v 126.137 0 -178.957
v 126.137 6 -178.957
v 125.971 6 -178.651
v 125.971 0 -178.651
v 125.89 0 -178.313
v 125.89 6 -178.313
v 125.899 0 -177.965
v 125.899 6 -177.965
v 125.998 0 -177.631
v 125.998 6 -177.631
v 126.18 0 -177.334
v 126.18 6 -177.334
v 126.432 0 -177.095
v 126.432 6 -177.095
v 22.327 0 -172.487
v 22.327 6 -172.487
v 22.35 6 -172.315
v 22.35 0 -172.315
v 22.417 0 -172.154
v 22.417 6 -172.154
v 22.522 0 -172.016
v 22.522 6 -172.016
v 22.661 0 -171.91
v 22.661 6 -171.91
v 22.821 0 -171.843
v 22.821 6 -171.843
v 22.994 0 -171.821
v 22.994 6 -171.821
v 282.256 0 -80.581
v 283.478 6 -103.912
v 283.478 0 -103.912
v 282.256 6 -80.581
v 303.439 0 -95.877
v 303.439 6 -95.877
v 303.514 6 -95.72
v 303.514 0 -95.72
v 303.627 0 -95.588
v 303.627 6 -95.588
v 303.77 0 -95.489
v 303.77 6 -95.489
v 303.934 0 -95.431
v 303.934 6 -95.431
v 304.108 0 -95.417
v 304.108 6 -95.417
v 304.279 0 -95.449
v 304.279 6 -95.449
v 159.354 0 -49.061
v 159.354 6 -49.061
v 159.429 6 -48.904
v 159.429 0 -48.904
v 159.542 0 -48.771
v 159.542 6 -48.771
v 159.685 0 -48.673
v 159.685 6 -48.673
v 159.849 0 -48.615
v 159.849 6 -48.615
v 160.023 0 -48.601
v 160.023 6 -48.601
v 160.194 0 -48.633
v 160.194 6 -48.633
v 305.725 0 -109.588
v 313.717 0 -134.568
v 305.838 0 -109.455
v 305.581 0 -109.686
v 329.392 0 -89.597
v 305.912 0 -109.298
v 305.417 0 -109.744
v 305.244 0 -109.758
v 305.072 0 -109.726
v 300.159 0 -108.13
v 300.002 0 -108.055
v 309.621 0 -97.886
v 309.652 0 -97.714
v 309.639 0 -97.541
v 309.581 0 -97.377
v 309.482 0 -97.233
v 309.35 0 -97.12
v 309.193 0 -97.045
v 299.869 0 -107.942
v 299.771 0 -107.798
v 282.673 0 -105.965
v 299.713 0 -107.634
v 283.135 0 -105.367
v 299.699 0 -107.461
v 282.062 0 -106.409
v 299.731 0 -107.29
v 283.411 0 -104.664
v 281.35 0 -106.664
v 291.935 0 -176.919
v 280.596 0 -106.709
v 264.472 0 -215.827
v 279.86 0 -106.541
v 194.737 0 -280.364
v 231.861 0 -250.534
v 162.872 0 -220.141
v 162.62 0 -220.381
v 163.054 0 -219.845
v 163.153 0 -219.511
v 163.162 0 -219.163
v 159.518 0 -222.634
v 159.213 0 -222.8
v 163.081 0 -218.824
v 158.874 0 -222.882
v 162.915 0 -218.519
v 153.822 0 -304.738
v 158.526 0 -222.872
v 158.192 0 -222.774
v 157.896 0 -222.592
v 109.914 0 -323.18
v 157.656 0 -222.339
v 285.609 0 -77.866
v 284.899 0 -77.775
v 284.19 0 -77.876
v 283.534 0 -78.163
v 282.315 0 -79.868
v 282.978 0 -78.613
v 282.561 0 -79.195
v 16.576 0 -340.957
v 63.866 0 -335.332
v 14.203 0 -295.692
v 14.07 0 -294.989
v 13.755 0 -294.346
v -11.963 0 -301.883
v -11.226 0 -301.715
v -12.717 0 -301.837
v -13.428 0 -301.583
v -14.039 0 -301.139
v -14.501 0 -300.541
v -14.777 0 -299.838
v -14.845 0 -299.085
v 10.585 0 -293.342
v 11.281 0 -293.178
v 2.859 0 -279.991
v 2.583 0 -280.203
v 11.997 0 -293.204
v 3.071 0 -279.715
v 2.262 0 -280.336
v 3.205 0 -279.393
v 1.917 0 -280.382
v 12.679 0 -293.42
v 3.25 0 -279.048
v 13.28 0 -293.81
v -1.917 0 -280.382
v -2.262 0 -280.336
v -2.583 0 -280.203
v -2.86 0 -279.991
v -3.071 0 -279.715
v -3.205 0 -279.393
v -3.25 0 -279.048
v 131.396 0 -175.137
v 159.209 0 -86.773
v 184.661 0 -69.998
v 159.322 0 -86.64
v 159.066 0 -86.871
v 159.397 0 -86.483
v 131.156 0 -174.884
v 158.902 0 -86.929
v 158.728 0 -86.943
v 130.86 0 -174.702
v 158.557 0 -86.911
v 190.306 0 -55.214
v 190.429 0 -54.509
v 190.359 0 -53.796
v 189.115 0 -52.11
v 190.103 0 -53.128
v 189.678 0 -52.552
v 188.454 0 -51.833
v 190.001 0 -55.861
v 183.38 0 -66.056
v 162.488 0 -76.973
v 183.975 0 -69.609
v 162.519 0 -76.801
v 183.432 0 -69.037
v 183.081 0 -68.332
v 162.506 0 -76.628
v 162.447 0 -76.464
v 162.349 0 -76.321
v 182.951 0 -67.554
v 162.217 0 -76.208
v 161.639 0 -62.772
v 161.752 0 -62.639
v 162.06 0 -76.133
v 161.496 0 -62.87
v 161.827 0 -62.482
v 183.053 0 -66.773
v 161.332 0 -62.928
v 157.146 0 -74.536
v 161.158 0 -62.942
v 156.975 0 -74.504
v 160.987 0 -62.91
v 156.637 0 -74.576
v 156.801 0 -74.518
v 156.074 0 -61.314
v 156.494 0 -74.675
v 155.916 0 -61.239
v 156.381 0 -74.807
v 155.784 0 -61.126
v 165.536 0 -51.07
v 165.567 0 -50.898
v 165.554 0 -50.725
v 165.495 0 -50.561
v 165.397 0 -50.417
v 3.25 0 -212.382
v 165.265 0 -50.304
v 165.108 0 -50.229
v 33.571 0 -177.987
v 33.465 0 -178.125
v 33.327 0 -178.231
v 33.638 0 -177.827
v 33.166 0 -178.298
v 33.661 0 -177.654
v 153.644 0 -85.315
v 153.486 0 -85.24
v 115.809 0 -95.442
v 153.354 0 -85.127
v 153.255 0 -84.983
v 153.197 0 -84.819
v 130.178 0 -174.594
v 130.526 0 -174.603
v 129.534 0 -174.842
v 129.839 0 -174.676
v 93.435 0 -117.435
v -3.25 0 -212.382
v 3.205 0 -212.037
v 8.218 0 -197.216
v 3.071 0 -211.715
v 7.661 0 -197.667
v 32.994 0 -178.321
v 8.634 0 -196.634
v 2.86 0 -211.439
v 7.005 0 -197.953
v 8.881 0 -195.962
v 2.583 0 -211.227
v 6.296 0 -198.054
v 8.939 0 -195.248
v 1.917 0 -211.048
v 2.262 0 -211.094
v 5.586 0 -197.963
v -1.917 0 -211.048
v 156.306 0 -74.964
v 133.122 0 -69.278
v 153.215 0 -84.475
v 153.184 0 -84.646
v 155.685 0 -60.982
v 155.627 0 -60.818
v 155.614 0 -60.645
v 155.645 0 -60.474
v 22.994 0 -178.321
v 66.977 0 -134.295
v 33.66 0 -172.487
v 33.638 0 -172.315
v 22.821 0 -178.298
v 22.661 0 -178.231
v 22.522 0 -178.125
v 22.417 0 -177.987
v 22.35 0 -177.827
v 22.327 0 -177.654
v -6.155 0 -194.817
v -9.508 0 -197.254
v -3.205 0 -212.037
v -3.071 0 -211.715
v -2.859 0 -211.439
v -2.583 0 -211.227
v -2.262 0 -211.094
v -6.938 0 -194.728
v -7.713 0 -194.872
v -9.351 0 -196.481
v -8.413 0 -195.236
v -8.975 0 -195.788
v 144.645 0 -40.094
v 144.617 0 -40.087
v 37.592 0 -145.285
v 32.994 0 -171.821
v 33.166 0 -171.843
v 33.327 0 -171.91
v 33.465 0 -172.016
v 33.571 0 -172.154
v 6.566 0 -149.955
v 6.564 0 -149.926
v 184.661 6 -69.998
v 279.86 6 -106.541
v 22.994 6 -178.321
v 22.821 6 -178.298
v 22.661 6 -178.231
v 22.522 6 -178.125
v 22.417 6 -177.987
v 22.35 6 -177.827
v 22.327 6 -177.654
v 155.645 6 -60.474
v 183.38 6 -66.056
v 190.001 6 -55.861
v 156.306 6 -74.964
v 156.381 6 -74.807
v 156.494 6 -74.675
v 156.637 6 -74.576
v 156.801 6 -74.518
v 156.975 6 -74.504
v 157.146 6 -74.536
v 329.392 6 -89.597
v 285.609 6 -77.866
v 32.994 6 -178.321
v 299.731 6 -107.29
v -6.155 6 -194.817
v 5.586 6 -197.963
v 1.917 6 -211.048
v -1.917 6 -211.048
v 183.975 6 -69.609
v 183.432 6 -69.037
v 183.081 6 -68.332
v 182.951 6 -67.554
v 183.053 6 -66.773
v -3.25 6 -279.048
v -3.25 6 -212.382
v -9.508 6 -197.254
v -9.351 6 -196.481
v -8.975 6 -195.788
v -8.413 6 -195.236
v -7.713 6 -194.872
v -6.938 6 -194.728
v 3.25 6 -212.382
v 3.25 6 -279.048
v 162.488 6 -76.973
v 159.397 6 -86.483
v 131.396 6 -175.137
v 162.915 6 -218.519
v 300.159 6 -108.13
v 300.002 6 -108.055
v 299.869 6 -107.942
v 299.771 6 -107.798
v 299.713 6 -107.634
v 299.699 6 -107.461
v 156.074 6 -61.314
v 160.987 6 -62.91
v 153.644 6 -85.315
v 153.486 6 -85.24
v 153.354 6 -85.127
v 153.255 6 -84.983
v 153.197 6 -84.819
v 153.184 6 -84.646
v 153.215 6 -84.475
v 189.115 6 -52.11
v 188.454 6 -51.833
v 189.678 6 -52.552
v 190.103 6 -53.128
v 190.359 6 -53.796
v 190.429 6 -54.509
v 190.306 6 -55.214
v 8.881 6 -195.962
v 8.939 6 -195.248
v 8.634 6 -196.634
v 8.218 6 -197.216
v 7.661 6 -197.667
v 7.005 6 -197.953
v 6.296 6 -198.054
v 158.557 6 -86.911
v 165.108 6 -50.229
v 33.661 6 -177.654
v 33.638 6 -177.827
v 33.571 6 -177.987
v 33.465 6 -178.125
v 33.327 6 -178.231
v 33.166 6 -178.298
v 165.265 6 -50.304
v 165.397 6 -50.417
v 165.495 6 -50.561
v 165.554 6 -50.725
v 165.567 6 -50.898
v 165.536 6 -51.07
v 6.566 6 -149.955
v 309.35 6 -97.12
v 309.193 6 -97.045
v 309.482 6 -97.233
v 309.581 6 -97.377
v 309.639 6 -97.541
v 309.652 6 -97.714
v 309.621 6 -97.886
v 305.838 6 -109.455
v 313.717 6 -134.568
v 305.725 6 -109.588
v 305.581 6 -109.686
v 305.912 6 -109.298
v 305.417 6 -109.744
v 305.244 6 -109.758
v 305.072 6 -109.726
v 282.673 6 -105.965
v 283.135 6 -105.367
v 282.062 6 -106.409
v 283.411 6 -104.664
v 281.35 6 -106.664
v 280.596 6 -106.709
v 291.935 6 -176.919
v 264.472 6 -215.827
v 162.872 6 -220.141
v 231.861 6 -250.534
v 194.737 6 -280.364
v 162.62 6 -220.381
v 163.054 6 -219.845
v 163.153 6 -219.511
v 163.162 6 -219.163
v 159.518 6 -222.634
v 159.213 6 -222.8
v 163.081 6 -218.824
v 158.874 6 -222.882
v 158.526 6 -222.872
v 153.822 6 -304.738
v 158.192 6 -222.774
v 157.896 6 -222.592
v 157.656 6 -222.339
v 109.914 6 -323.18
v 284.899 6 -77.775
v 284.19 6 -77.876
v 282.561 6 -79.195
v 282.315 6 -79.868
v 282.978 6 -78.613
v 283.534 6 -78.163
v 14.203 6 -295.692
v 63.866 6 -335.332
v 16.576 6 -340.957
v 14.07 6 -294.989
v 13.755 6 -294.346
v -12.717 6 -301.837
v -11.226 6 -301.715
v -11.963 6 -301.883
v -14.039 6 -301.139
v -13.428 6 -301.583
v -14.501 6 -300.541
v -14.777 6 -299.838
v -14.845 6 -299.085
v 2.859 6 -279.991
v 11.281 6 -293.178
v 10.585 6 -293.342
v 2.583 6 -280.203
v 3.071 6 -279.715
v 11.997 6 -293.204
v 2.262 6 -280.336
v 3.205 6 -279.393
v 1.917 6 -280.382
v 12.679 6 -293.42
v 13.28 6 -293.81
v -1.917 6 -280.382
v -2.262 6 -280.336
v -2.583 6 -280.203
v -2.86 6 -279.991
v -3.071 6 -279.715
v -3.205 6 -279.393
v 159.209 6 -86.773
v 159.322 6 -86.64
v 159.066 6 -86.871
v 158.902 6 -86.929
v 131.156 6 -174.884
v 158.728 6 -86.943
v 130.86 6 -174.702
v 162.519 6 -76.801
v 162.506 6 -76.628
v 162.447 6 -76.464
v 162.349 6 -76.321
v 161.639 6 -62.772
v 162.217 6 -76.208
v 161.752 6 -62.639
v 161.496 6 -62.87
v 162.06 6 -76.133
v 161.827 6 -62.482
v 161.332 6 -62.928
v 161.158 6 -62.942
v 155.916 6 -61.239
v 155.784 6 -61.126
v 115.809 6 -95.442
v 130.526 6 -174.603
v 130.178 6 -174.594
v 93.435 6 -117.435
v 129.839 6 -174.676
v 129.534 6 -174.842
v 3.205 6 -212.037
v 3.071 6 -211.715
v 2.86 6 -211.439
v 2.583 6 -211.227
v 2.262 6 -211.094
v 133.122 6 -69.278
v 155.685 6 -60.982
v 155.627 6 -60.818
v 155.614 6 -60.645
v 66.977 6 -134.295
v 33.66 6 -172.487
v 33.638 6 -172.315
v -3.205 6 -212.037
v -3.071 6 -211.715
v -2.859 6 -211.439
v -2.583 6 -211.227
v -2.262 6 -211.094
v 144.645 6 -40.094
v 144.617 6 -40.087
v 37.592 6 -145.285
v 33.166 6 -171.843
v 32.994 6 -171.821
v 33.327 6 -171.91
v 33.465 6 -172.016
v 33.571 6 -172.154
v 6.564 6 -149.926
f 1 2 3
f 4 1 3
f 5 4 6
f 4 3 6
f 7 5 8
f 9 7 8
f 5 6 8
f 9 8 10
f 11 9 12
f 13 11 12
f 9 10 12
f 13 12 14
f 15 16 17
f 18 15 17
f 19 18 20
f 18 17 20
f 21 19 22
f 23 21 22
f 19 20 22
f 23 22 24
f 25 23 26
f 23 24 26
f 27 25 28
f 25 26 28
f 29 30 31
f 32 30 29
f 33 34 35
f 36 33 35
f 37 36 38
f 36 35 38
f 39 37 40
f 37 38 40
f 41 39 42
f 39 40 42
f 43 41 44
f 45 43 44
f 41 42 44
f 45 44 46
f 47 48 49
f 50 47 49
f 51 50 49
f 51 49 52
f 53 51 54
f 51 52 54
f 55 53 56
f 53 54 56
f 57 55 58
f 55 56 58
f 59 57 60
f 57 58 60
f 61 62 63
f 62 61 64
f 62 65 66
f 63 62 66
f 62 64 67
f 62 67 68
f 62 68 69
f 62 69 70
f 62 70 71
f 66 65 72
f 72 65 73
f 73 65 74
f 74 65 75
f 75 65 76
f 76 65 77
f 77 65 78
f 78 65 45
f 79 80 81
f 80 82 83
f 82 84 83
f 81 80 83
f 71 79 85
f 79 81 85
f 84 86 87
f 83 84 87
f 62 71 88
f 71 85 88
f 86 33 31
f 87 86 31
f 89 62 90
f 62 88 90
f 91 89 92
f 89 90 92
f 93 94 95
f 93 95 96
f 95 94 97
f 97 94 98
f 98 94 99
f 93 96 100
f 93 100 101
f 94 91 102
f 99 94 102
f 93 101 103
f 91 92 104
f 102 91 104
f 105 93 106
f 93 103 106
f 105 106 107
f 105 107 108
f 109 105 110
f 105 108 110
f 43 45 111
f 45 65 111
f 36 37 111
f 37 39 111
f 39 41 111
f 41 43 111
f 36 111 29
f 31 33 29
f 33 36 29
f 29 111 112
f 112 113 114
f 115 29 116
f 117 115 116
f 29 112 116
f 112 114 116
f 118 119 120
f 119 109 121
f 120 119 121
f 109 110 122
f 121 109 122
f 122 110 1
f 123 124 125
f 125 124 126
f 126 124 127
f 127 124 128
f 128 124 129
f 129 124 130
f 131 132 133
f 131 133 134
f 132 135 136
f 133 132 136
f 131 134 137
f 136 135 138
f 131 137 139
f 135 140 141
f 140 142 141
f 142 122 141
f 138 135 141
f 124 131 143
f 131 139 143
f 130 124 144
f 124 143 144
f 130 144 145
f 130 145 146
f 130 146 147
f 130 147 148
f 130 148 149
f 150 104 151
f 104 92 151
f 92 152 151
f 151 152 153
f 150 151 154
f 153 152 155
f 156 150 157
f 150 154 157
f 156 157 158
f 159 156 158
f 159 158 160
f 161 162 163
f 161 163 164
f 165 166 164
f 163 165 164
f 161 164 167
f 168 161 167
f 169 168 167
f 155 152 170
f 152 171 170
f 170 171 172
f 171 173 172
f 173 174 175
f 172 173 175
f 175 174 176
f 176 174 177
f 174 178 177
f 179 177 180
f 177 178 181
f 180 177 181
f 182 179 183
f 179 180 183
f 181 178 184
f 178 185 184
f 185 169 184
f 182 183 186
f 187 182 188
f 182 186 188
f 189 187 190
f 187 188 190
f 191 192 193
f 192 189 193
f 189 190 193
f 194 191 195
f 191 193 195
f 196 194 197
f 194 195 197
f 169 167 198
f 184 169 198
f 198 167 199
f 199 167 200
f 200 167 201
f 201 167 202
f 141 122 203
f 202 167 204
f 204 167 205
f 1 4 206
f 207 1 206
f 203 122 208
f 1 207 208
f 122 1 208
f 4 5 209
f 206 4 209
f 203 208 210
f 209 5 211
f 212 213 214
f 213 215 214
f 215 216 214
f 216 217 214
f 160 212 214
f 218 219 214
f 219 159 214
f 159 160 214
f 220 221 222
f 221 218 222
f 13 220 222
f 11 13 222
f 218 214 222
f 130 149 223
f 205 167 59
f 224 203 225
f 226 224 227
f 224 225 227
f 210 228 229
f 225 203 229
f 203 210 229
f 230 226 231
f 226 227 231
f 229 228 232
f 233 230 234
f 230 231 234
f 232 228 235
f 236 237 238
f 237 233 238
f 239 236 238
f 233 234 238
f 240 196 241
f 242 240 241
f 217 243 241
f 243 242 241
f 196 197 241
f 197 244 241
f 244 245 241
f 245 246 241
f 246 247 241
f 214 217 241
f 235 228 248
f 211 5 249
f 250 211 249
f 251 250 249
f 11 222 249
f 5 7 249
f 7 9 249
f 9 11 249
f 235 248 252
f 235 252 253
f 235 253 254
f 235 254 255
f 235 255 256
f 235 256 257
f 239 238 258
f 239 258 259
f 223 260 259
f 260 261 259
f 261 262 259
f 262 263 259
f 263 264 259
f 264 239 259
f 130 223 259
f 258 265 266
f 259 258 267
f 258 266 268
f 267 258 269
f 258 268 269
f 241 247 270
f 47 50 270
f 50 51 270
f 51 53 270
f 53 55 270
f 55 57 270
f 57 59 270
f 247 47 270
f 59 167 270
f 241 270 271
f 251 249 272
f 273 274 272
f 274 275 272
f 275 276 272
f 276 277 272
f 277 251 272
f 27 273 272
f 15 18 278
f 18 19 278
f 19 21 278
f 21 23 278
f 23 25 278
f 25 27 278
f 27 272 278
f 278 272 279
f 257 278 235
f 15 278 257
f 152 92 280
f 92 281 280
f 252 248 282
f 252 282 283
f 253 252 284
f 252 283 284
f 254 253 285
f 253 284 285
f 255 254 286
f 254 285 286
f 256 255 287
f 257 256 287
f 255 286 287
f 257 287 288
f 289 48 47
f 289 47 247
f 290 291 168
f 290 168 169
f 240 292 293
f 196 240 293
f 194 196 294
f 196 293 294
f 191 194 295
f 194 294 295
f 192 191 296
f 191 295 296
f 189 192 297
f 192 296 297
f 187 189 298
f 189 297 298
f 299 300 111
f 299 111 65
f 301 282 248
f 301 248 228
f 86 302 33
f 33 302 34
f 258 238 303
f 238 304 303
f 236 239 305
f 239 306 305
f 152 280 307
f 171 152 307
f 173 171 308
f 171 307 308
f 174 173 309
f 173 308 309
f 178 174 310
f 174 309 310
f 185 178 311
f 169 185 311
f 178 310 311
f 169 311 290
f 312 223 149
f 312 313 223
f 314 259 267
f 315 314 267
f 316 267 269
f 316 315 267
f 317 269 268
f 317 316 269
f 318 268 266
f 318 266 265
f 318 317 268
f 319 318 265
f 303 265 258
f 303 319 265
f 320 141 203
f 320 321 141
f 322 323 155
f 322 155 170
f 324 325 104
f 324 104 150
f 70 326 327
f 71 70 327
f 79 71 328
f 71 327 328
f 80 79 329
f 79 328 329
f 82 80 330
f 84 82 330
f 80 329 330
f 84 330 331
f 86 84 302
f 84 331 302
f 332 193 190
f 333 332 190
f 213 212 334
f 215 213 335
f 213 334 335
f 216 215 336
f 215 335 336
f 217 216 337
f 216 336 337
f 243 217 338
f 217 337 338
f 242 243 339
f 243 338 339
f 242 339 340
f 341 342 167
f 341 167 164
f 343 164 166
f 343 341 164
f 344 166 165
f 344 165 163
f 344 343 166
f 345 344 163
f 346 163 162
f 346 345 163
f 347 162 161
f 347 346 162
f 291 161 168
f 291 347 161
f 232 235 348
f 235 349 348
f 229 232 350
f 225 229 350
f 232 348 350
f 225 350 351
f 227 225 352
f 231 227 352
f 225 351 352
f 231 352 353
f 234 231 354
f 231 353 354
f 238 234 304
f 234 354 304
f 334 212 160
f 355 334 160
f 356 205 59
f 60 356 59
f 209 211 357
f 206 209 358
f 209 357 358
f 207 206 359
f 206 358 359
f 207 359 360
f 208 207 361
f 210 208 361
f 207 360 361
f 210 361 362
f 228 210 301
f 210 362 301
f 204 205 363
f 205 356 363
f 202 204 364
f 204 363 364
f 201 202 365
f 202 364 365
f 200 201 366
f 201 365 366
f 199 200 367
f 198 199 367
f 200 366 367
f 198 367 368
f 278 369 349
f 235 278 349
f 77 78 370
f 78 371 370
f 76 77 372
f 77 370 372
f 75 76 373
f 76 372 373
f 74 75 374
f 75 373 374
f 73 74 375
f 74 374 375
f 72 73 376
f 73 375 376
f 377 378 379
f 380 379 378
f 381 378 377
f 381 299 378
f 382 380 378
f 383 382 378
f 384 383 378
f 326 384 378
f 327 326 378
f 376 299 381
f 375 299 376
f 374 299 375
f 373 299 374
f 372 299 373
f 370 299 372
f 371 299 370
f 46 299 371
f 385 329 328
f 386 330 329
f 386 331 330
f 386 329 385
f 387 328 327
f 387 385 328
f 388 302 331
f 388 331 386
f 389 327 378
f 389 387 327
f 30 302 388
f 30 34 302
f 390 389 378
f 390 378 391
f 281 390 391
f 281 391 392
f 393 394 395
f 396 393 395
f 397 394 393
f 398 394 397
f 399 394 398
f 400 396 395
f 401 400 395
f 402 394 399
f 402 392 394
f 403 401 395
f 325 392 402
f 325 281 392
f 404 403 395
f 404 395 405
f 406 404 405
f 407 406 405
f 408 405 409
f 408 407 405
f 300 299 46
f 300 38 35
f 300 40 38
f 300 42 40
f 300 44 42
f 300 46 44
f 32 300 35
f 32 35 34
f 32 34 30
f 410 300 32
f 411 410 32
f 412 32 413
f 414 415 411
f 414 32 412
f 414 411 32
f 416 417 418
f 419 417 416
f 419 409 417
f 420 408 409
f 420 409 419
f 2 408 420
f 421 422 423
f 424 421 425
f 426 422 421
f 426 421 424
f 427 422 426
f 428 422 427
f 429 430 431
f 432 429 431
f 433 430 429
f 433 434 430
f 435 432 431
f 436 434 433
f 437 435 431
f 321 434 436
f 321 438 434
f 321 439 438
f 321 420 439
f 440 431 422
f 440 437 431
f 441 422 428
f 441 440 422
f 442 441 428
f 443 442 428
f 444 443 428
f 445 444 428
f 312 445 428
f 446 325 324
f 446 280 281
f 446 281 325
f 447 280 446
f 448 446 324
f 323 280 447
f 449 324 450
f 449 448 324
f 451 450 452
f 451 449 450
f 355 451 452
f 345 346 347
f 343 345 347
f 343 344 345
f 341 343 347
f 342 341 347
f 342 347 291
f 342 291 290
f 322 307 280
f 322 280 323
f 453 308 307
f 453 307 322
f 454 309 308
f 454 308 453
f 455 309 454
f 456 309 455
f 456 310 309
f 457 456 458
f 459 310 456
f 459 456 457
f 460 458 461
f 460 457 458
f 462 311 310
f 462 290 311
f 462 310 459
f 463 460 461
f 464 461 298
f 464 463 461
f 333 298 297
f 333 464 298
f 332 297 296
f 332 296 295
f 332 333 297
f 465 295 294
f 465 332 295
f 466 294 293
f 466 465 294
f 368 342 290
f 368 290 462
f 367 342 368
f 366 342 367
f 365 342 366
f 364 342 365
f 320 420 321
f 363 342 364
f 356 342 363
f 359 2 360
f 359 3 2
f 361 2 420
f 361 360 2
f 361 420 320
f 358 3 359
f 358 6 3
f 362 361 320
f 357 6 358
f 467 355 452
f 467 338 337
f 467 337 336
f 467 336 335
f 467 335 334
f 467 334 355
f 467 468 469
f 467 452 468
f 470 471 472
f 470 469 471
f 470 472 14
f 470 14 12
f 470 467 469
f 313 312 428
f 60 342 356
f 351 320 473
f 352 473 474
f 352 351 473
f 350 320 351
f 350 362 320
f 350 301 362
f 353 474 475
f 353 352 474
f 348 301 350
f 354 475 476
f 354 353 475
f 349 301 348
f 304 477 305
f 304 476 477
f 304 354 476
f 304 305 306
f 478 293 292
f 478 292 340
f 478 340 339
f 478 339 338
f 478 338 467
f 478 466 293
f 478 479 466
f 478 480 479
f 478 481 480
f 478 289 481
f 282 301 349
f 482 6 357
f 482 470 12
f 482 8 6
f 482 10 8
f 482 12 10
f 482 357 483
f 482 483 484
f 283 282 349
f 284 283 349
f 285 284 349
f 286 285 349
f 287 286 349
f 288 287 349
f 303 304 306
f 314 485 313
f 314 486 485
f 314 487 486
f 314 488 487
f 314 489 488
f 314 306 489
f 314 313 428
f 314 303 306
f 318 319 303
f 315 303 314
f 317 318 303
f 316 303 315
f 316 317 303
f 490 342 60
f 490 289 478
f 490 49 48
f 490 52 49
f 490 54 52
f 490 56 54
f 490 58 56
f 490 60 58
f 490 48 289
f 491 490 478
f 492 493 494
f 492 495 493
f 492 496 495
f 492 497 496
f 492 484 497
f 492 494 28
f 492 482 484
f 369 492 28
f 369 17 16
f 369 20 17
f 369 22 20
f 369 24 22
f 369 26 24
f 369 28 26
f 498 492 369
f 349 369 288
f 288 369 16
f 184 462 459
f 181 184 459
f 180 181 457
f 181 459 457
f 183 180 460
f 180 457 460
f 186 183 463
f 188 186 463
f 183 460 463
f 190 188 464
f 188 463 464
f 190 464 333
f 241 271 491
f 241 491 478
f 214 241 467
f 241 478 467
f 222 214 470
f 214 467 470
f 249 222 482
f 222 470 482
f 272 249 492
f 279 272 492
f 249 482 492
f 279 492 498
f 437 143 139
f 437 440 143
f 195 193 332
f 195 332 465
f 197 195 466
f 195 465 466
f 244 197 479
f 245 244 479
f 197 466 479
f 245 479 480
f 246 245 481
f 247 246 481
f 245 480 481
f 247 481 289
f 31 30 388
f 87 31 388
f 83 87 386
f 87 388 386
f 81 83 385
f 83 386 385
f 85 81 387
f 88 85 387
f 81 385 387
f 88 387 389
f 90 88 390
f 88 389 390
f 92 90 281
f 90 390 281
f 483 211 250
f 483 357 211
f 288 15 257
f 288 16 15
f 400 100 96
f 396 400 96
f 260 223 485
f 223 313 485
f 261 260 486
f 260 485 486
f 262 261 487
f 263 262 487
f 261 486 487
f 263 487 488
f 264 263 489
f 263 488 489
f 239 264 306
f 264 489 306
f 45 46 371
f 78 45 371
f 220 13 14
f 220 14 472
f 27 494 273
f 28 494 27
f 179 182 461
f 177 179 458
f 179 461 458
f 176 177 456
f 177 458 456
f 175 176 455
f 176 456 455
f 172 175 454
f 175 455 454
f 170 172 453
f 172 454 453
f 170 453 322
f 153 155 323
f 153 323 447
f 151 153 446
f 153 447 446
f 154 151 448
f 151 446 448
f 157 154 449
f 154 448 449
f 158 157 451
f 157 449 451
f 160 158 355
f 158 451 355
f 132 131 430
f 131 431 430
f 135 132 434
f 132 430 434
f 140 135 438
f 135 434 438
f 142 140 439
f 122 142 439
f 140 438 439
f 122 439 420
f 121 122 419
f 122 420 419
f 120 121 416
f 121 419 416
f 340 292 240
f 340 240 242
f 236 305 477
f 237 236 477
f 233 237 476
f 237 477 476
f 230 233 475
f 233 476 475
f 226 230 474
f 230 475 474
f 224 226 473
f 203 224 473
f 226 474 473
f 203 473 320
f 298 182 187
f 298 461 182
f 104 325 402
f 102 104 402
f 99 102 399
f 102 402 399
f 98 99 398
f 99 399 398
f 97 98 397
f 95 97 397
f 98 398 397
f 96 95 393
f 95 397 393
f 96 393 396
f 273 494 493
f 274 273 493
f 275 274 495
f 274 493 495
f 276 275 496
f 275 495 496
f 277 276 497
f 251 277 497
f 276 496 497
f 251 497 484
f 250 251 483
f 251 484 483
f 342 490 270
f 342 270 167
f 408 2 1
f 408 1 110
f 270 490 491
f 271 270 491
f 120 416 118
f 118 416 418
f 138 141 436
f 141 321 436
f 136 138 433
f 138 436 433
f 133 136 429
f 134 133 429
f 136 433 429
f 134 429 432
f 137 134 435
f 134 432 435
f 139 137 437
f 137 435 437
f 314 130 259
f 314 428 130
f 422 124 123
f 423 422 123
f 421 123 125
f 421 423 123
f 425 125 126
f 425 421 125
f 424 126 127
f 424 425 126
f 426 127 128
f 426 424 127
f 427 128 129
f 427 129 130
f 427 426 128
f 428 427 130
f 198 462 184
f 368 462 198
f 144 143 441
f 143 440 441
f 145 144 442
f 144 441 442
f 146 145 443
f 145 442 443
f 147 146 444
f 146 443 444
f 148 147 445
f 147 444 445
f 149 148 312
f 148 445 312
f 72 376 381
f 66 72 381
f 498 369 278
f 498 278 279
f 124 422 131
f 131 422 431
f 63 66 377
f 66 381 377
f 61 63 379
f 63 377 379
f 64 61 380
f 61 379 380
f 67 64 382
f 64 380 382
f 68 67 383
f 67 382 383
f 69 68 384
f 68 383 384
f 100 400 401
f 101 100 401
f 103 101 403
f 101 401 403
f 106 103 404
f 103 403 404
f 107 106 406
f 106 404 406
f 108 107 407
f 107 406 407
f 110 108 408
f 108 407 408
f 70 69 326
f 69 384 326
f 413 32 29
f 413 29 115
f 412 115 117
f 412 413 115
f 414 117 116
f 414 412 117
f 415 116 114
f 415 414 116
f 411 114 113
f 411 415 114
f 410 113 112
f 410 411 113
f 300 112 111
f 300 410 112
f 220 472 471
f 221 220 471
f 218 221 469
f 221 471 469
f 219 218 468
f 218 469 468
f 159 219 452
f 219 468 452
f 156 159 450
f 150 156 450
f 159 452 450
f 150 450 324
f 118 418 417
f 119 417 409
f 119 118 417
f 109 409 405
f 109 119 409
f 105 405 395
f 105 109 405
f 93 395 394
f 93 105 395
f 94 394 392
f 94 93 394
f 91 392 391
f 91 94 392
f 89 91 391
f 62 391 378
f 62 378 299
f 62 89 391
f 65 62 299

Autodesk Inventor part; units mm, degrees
ref_plane "YZ Plane" through (0, 0, 0) normal (1, 0, 0) x (0, 1, 0)
ref_plane "XZ Plane" through (0, 0, 0) normal (0, 1, 0) x (-1, 0, 0)
sketch "Sketch1" plane through (0, 0, 0) normal (0, 1, 0) x (-1, 0, 0)
  circle A0 centre (0, 0) radius 341.36
  circle A1 centre (0, 0) radius 150.07
  dimension "d84" = 300.14
  dimension "d85" = 682.72
extrude "Extrusion3" add sketch "Sketch1" along normal blind 6 contours A0 | A1
sketch "Sketch2" plane through (0, 6, 0) normal (0, 1, 0) x (1, 0, 0)
  circle A0 centre (0, 0) radius 245.715 construction
  line L0 (245.7148, 0.3131) -> (341.6521, -0.0088)
  line L1 (-0.6289, 279.0483) -> (-0.0524, 279.0483)
  line L2 (3.25, 279.0483) -> (3.25, 212.3817)
  line L3 (0.5377, 212.3817) -> (-0.051, 212.3817)
  line L4 (-3.25, 212.3817) -> (-3.25, 279.0483)
  arc A1 (-3.25, 212.3817) -> (-1.9167, 211.0483) centre (-1.9167, 212.3817) ccw
  arc A2 (1.9167, 211.0483) -> (3.25, 212.3817) centre (1.9167, 212.3817) ccw
  arc A3 (-1.9167, 280.3817) -> (-3.25, 279.0483) centre (-1.9167, 279.0483) ccw
  arc A4 (3.25, 279.0483) -> (1.9167, 280.3817) centre (1.9167, 279.0483) ccw
  line L5 (-1.9167, 280.3817) -> (1.9167, 280.3817)
  line L6 (-1.9167, 211.0483) -> (1.9167, 211.0483)
  line L7 (0, 0) -> (0, 212.3817)
  line L8 (0, 280.3817) -> (0, 341.36)
  line L9 (0, 211.0483) -> (0, 245.715) construction
  line L10 (0, 280.3817) -> (0, 245.715) construction
  arc A5 (-157.4948, 221.8428) -> (-159.3572, 222.1378) centre (-158.5735, 221.0591) ccw
  line L11 (-162.4585, 219.8846) -> (-159.3572, 222.1378)
  arc A6 (-162.4585, 219.8846) -> (-162.7534, 218.0222) centre (-161.6748, 218.8059) ccw
  line L12 (-160.9079, 221.0112) -> (-144.3647, 198.2416) construction
  line L13 (-160.633, 219.5628) -> (-160.1666, 219.9017)
  line L14 (-157.4948, 221.8428) -> (-125.976, 178.4609)
  line L15 (-131.2346, 174.6403) -> (-162.7534, 218.0222)
  line L16 (-127.8216, 175.4719) -> (-144.3647, 198.2416) construction
  line L17 (-128.1703, 176.8667) -> (-128.6466, 176.5206)
  arc A7 (-126.271, 176.5985) -> (-125.976, 178.4609) centre (-127.0547, 177.6772) ccw
  line L18 (-129.3722, 174.3453) -> (-126.271, 176.5985)
  arc A8 (-131.2346, 174.6403) -> (-129.3722, 174.3453) centre (-130.156, 175.424) ccw
  arc A9 (-259.6684, -81.8575) -> (-260.5244, -83.5376) centre (-259.2564, -83.1256) ccw
  line L19 (-259.3399, -87.1834) -> (-260.5244, -83.5376)
  arc A10 (-259.3399, -87.1834) -> (-257.6598, -88.0394) centre (-258.0718, -86.7713) ccw
  line L20 (-259.9321, -85.3605) -> (-233.1648, -76.6633) construction
  line L21 (-258.4697, -85.5466) -> (-258.6479, -84.9983)
  line L22 (-259.6684, -81.8575) -> (-208.6699, -65.2871)
  line L23 (-206.6613, -71.469) -> (-257.6598, -88.0394)
  line L24 (-206.3975, -67.966) -> (-233.1648, -76.6633) construction
  line L25 (-207.8317, -67.8666) -> (-207.6498, -68.4265)
  arc A11 (-206.9898, -66.1432) -> (-208.6699, -65.2871) centre (-208.2578, -66.5552) ccw
  line L26 (-205.8052, -69.7889) -> (-206.9898, -66.1432)
  arc A12 (-206.6613, -71.469) -> (-205.8052, -69.7889) centre (-207.0733, -70.2009) ccw
  arc A13 (258.6901, -87.4674) -> (260.3702, -86.6114) centre (259.1021, -86.1993) ccw
  line L27 (261.5548, -82.9657) -> (260.3702, -86.6114)
  arc A14 (261.5548, -82.9657) -> (260.6987, -81.2856) centre (260.2867, -82.5536) ccw
  line L28 (260.9625, -84.7885) -> (234.1951, -76.0913) construction
  line L29 (259.8887, -83.7783) -> (259.7106, -84.3266)
  line L30 (258.6901, -87.4674) -> (207.6916, -70.897)
  line L31 (209.7002, -64.7151) -> (260.6987, -81.2856)
  line L32 (207.4278, -67.394) -> (234.1951, -76.0913) construction
  line L33 (208.5297, -68.3175) -> (208.7116, -67.7576)
  arc A15 (206.8355, -69.2169) -> (207.6916, -70.897) centre (208.1036, -69.6289) ccw
  line L34 (208.0201, -65.5712) -> (206.8355, -69.2169)
  arc A16 (209.7002, -64.7151) -> (208.0201, -65.5712) centre (209.2882, -65.9832) ccw
  arc A17 (162.9147, 218.5186) -> (162.6198, 220.381) centre (161.836, 219.3023) ccw
  line L35 (159.5185, 222.6342) -> (162.6198, 220.381)
  arc A18 (159.5185, 222.6342) -> (157.6561, 222.3392) centre (158.7348, 221.5555) ccw
  line L36 (161.0691, 221.5076) -> (144.526, 198.7379) construction
  line L37 (159.7766, 220.7986) -> (160.243, 220.4597)
  line L38 (162.9147, 218.5186) -> (131.3959, 175.1367)
  line L39 (126.1373, 178.9573) -> (157.6561, 222.3392)
  line L40 (127.9829, 175.9683) -> (144.526, 198.7379) construction
  line L41 (129.2017, 176.7309) -> (128.7254, 177.0769)
  arc A19 (129.5335, 174.8417) -> (131.3959, 175.1367) centre (130.3172, 175.9204) ccw
  line L42 (126.4323, 177.0949) -> (129.5335, 174.8417)
  arc A20 (126.1373, 178.9573) -> (126.4323, 177.0949) centre (127.216, 178.1736) ccw
  line L43 (-265.5851, 85.6325) -> (-265.4069, 86.1808)
  line L44 (-267.2511, 84.8198) -> (-266.0665, 88.4656)
  line L45 (-201.3112, 63.3947) -> (-200.1266, 67.0404)
  arc A21 (-267.2511, 84.8198) -> (-266.395, 83.1397) centre (-265.983, 84.4078) ccw
  arc A22 (-264.3864, 89.3216) -> (-266.0665, 88.4656) centre (-264.7985, 88.0535) ccw
  line L46 (-266.6588, 86.6427) -> (-233.6889, 75.9301) construction
  line L47 (-202.9913, 62.5386) -> (-266.395, 83.1397)
  line L48 (-264.3864, 89.3216) -> (-200.9827, 68.7205)
  line L49 (-200.7189, 65.2175) -> (-233.6889, 75.9301) construction
  arc A23 (-202.9913, 62.5386) -> (-201.3112, 63.3947) centre (-202.5793, 63.8067) ccw
  arc A24 (-200.1266, 67.0404) -> (-200.9827, 68.7205) centre (-201.3947, 67.4524) ccw
  line L50 (-201.8208, 66.141) -> (-202.0027, 65.5811)
  line L51 (-163.5117, -226.1245) -> (-163.9781, -225.7857)
  line L52 (-163.2536, -227.9601) -> (-166.3548, -225.7069)
  line L53 (-122.5005, -171.8683) -> (-125.6017, -169.6151)
  arc A25 (-163.2536, -227.9601) -> (-161.3912, -227.6651) centre (-162.4699, -226.8814) ccw
  arc A26 (-166.6498, -223.8445) -> (-166.3548, -225.7069) centre (-165.5711, -224.6283) ccw
  line L54 (-164.8042, -226.8335) -> (-144.4277, -198.7876) construction
  line L55 (-122.2055, -173.7307) -> (-161.3912, -227.6651)
  line L56 (-166.6498, -223.8445) -> (-127.4641, -169.9101)
  line L57 (-124.0511, -170.7417) -> (-144.4277, -198.7876) construction
  arc A27 (-122.2055, -173.7307) -> (-122.5005, -171.8683) centre (-123.2842, -172.947) ccw
  arc A28 (-125.6017, -169.6151) -> (-127.4641, -169.9101) centre (-126.3854, -170.6938) ccw
  line L58 (-125.2699, -171.5043) -> (-124.7936, -171.8503)
  line L59 (164.5293, -225.3852) -> (164.0629, -225.724)
  line L60 (166.3548, -225.7069) -> (163.2536, -227.9601)
  line L61 (125.6017, -169.6151) -> (122.5005, -171.8683)
  arc A29 (166.3548, -225.7069) -> (166.6498, -223.8445) centre (165.5711, -224.6283) ccw
  arc A30 (161.3912, -227.6651) -> (163.2536, -227.9601) centre (162.4699, -226.8814) ccw
  line L62 (164.8042, -226.8335) -> (144.4277, -198.7876) construction
  line L63 (127.4641, -169.9101) -> (166.6498, -223.8445)
  line L64 (161.3912, -227.6651) -> (122.2055, -173.7307)
  line L65 (124.0511, -170.7417) -> (144.4277, -198.7876) construction
  arc A31 (127.4641, -169.9101) -> (125.6017, -169.6151) centre (126.3854, -170.6938) ccw
  arc A32 (122.5005, -171.8683) -> (122.2055, -173.7307) centre (123.2842, -172.947) ccw
  line L66 (124.3998, -172.1365) -> (124.8761, -171.7904)
  line L67 (265.1964, 86.8288) -> (265.3745, 86.2805)
  line L68 (266.0665, 88.4656) -> (267.2511, 84.8198)
  line L69 (200.1266, 67.0404) -> (201.3112, 63.3947)
  arc A33 (266.0665, 88.4656) -> (264.3864, 89.3216) centre (264.7985, 88.0535) ccw
  arc A34 (266.395, 83.1397) -> (267.2511, 84.8198) centre (265.983, 84.4078) ccw
  line L70 (266.6588, 86.6427) -> (233.6889, 75.9301) construction
  line L71 (200.9827, 68.7205) -> (264.3864, 89.3216)
  line L72 (266.395, 83.1397) -> (202.9913, 62.5386)
  line L73 (200.7189, 65.2175) -> (233.6889, 75.9301) construction
  arc A35 (200.9827, 68.7205) -> (200.1266, 67.0404) centre (201.3947, 67.4524) ccw
  arc A36 (201.3112, 63.3947) -> (202.9913, 62.5386) centre (202.5793, 63.8067) ccw
  line L74 (202.1531, 65.1181) -> (201.9712, 65.678)
  line L75 (236.8664, -101.279) -> (236.7913, -101.5102)
  point P0 (-128.6053, 176.5506)
  point P1 (-207.6656, -68.3781)
  point P2 (208.6959, -67.8061)
  point P3 (128.7666, 177.047)
  point P4 (-201.987, 65.6295)
  point P5 (-124.8348, -171.8204)
  point P6 (124.8348, -171.8204)
  point P7 (201.987, 65.6295)
  dimension "d21" = 6.5
  dimension "d23" = 66.6667
  dimension "d24" = 2.6667
  dimension "d25" = 2.6667
  dimension "d32" = 1.3333
  dimension "d33" = 1.3333
  dimension "d41" = 90
  dimension "d42" = 3.25
  dimension "d43" = 90
  dimension "d49" = 360
  dimension "d86" = 491.43
  dimension "d96" = 0.243
extrude "Extrusion4" cut sketch "Sketch2" against normal through all
sketch "Sketch3" plane through (0, 6, 0) normal (0, 1, 0) x (1, 0, 0)
  arc A0 (-115.2299, -321.3234) -> (115.2355, -321.3214) centre (0, 0) ccw
  arc A1 (-77.7244, -128.3741) -> (77.7297, -128.3709) centre (0, 0) ccw
  line L0 (-122.1811, -173.696) -> (-161.3589, -227.6196)
  line L1 (-115.2299, -321.3234) -> (-77.7244, -128.3741)
  line L2 (0, 0) -> (0, -341.2918)
  line L3 (115.2355, -321.3214) -> (77.7297, -128.3709)
  line L4 (161.3912, -227.6651) -> (122.2055, -173.7307) projected
  dimension "d52" = 25
  dimension "d87" = 150.07
  dimension "d88" = 341.36
  dimension "d89" = 25
  dimension "d90" = 11
  dimension "d91" = 11
extrude "Extrusion5" cut sketch "Sketch3" against normal blind 10
sketch "Sketch5" plane through (0, 6, 0) normal (0, 1, 0) x (1, 0, 0)
  line L0 (3.25, 279.0483) -> (3.25, 212.3817) projected
  line L1 (5.5862, 197.9634) -> (-6.155, 194.8174)
  line L2 (-11.2263, 301.7146) -> (10.5847, 293.3421)
  line L3 (6.5657, 149.9554) -> (8.9394, 195.248)
  line L4 (14.2034, 295.6921) -> (16.5771, 340.9846)
  arc A0 (10.5847, 293.3421) -> (14.2034, 295.6921) centre (11.5404, 295.8316) ccw
  arc A1 (8.9394, 195.248) -> (5.5862, 197.9634) centre (6.2763, 195.3876) ccw
  arc A2 (-11.2263, 301.7146) -> (-14.8449, 299.0854) centre (-12.1819, 299.225) ccw
  line L5 (-3.25, 212.3817) -> (-3.25, 279.0483) projected
  line L6 (-14.8449, 299.0854) -> (-9.5081, 197.2536)
  arc A3 (-9.5081, 197.2536) -> (-6.155, 194.8174) centre (-6.8451, 197.3932) ccw
  line L7 (-1.9167, 211.0483) -> (1.9167, 211.0483) projected
  line L8 (1.9167, 280.3817) -> (-1.9167, 280.3817) projected
  arc A4 (115.2355, -321.3214) -> (-115.2299, -321.3234) centre (0, 0) ccw
  line L9 (16.5771, 340.9846) -> (16.5774, 340.9903)
  arc A5 (-190.5375, 51.9119) -> (-187.1843, 54.3482) centre (-189.8473, 54.4877) ccw
  line L10 (-186.5481, 66.4868) -> (-187.1843, 54.3482)
  arc A6 (-182.9295, 68.8368) -> (-186.5481, 66.4868) centre (-183.8851, 66.3472) ccw
  arc A7 (-275.714, 100.7144) -> (-276.8308, 104.8821) centre (-277.7864, 102.3926) ccw
  line L11 (-289.0345, 78.3041) -> (-190.5375, 51.9119)
  arc A8 (-290.4167, 82.5581) -> (-289.0345, 78.3041) centre (-288.3443, 80.8799) ccw
  line L12 (-290.4167, 82.5581) -> (-275.714, 100.7144)
  line L13 (-276.8308, 104.8821) -> (-319.1731, 121.1358)
  line L14 (-140.5872, 52.5831) -> (-182.9295, 68.8368)
  line L15 (-319.1731, 121.1358) -> (-319.1784, 121.1378)
  arc A9 (184.6611, 69.9975) -> (183.3803, 66.0556) centre (185.6168, 67.508) ccw
  line L16 (190.0006, 55.8613) -> (183.3803, 66.0556)
  arc A10 (188.4543, 51.8331) -> (190.0006, 55.8613) centre (187.7641, 54.4089) ccw
  arc A11 (282.2558, 80.581) -> (285.609, 77.8656) centre (284.9188, 80.4414) ccw
  line L17 (279.8598, 106.5409) -> (184.6611, 69.9975)
  arc A12 (283.4785, 103.9117) -> (279.8598, 106.5409) centre (280.8155, 104.0513) ccw
  line L18 (283.4785, 103.9117) -> (282.2558, 80.581)
  line L19 (285.609, 77.8656) -> (329.4183, 89.6043)
  line L20 (144.645, 40.0945) -> (188.4543, 51.8331)
  line L21 (329.4183, 89.6043) -> (329.4238, 89.6058)
  circle A13 centre (0, 0) radius 150.07
  line L22 (-140.5872, 52.5831) -> (-140.5479, 52.568)
  line L23 (144.645, 40.0945) -> (144.5122, 40.0589)
  line L24 (6.5657, 149.9554) -> (6.5621, 149.8874)
  arc A14 (-77.7244, -128.3741) -> (77.7297, -128.3709) centre (0, 0) ccw projected
  arc A15 (115.2355, -321.3214) -> (-115.2299, -321.3234) centre (0, 0) ccw projected
  line L25 (77.7297, -128.3709) -> (115.2355, -321.3214)
  line L26 (-77.7244, -128.3741) -> (-115.2299, -321.3234)
  point P0 (-77.7399, -128.3998)
  point P1 (77.7399, -128.3998)
  point P2 (-319.1475, 121.126)
  point P3 (-140.56, 52.5727)
  point P4 (6.5642, 149.9264)
  point P5 (16.5757, 340.9573)
  point P6 (329.3918, 89.5972)
  point P7 (144.6169, 40.0869)
  dimension "d63" = 2.6667
  dimension "d64" = 3
  dimension "d66" = 3
  dimension "d67" = 2.6667
  dimension "d68" = 2.6667
  dimension "d70" = 72
  dimension "d71" = 72
  dimension "d94" = 300.14
  dimension "d95" = 682.72
sketch "Sketch6" plane through (0, 6, 0) normal (0, 1, 0) x (1, 0, 0)
  line L0 (188.7727, -264.2184) -> (198.4809, -257.165)
  line L1 (194.6603, -251.9064) -> (184.9521, -258.9598)
  line L2 (161.3912, -227.6651) -> (122.2055, -173.7307) projected
  line L3 (166.3548, -225.7069) -> (163.2536, -227.9601) projected
  arc A0 (195.5915, -252.0539) -> (194.6603, -251.9064) centre (195.0522, -252.4457) ccw
  arc A1 (198.4809, -257.165) -> (198.6284, -256.2338) centre (198.0891, -256.6256) ccw
  arc A2 (187.8415, -264.0709) -> (188.7727, -264.2184) centre (188.3809, -263.6791) ccw
  arc A3 (184.9521, -258.9598) -> (184.8046, -259.891) centre (185.344, -259.4991) ccw
  line L4 (184.8046, -259.891) -> (187.8415, -264.0709)
  line L5 (198.6284, -256.2338) -> (195.5915, -252.0539)
  line L6 (122.2055, -173.7307) -> (161.3912, -227.6651) projected
  line L7 (141.7983, -200.6979) -> (147.057, -196.8773)
  line L8 (166.6498, -223.8445) -> (127.4641, -169.9101) projected
  line L9 (95.9027, -136.3937) -> (105.6109, -129.3403)
  line L10 (109.4315, -134.5989) -> (99.7233, -141.6523)
  arc A4 (109.4315, -134.5989) -> (109.579, -133.6677) centre (109.0396, -134.0596) ccw
  arc A5 (106.5421, -129.4878) -> (105.6109, -129.3403) centre (106.0027, -129.8796) ccw
  arc A6 (95.9027, -136.3937) -> (95.7552, -137.3249) centre (96.2945, -136.9331) ccw
  arc A7 (98.7921, -141.5048) -> (99.7233, -141.6523) centre (99.3314, -141.113) ccw
  line L11 (98.7921, -141.5048) -> (95.7552, -137.3249)
  line L12 (106.5421, -129.4878) -> (109.579, -133.6677)
  point P0 (0, 0)
  dimension "d104" = 6.5
  dimension "d105" = 12
  dimension "d108" = 1.3333
  dimension "d109" = 1.3333
  dimension "d110" = 1.3333
  dimension "d111" = 1.3333
  dimension "d112" = 0
  dimension "d149" = 145
  dimension "d150" = 90
  dimension "d151" = 90
  dimension "d152" = 90
  dimension "d153" = 90
extrude "Extrusion7" cut sketch "Sketch6" against normal through all
sketch "Sketch7" plane through (0, 6, 0) normal (0, 1, 0) x (1, 0, 0)
  line L0 (119.5964, -125.4786) -> (127.6865, -119.6008)
  line L1 (106.4838, -136.3528) -> (96.7756, -143.4062)
  line L2 (128.6177, -119.7483) -> (131.6546, -123.9282)
  line L3 (131.5071, -124.8594) -> (123.417, -130.7373)
  line L4 (122.4858, -130.5898) -> (119.4489, -126.4098)
  line L5 (103.5944, -131.2417) -> (106.6313, -135.4216)
  arc A0 (119.5964, -125.4786) -> (119.4489, -126.4098) centre (119.9882, -126.018) ccw
  arc A1 (122.4858, -130.5898) -> (123.417, -130.7373) centre (123.0251, -130.1979) ccw
  arc A2 (128.6177, -119.7483) -> (127.6865, -119.6008) centre (128.0784, -120.1401) ccw
  arc A3 (131.5071, -124.8594) -> (131.6546, -123.9282) centre (131.1153, -124.3201) ccw
  line L6 (173.6068, 21.7165) -> (170.5167, 31.227)
  line L7 (170.9447, 32.0671) -> (175.8585, 33.6637)
  line L8 (176.6985, 33.2357) -> (179.7887, 23.7251)
  line L9 (179.3607, 22.885) -> (174.4469, 21.2885)
  arc A4 (173.6068, 21.7165) -> (174.4469, 21.2885) centre (174.2409, 21.9225) ccw
  arc A5 (179.3607, 22.885) -> (179.7887, 23.7251) centre (179.1547, 23.5191) ccw
  arc A6 (170.9447, 32.0671) -> (170.5167, 31.227) centre (171.1507, 31.4331) ccw
  arc A7 (176.6985, 33.2357) -> (175.8585, 33.6637) centre (176.0645, 33.0296) ccw
  line L10 (188.4543, 51.8331) -> (144.6169, 40.0869) projected
  line L11 (201.3112, 63.3947) -> (200.1266, 67.0404) projected
  line L12 (179.8921, 12.7927) -> (180.0981, 12.1586)
  line L13 (183.5904, 29.3861) -> (183.8471, 29.4696)
  point P0 (0, 0)
  dimension "d116" = 1.3333
  dimension "d117" = 1.3333
  dimension "d119" = 1.3333
  dimension "d120" = 1.3333
  dimension "d121" = 6.5
  dimension "d122" = 10
  dimension "d126" = 1.09
  dimension "d127" = 16.3333
  dimension "d128" = 1.3333
  dimension "d129" = 1.3333
  dimension "d130" = 1.3333
  dimension "d131" = 1.3333
  dimension "d132" = 6.5
  dimension "d133" = 10
  dimension "d135" = 3
  dimension "d140" = 0.6667
  dimension "d148" = 0.27
extrude "Extrusion8" cut sketch "Sketch7" against normal through all contours L0 A2 L2 A3 L3 A1 L4 A0
extrude "Extrusion9" cut sketch "Sketch7" against normal through all contours L6 A6 L7 A7 L8 A5 L9 A4
ref_plane "Work Plane1" through (265.3907, 0, -86.2307) normal (0.309, 0, 0.9511) x (0.9511, 0, -0.309)
mirror "Mirror2" about plane through (265.3907, 0, -86.2307) normal (0.309, 0, 0.9511) of "Extrusion9"
mirror "Mirror1" about plane through (0, 0, 0) normal (1, 0, 0) of "Extrusion8", "Extrusion9", "Mirror2"
pattern_circular "Circular Pattern1" count 2 over 72 about axis through (0, -10, 0) along (0, 1, 0) of "Extrusion9", "Mirror2"
pattern_circular "Circular Pattern2" count 2 over 72 about axis through (0, -10, 0) along (0, 1, 0) of "Extrusion7"
pattern_circular "Circular Pattern3" count 2 over 144 about axis through (0, -10, 0) along (0, 1, 0) of "Extrusion7"
mirror "Mirror3" about plane through (0, 0, 0) normal (1, 0, 0) of "Extrusion7", "Circular Pattern2"
extrude "Extrusion10" cut sketch "Sketch5" against normal through all contours A1 L3 L24 A13 L22 L14 A6 L10 A5 L11 A8 L12 A7 L13 A4 L4 A0 L2 A2 L6 A3 L1 | A13 | L23 L20 A10 L16 A9 L17 A12 L18 A11 L19 A4 L25 A13 | A13 L26 A4 L13 A7 L12 A8 L11 A5 L10 A6 L14 L22
equation "\"BendRadius\" = Thickness"
equation "\"BendReliefWidth\" = Thickness"
equation "\"BendReliefDepth\" = 0.5 * Thickness"
equation "\"CornerReliefSize\" = 4 * Thickness"
equation "\"MinimumRemnant\" = 2 * Thickness"
equation "\"TransitionRadius\" = BendRadius"
equation "\"JacobiRadiusSize\" = BendRadius"
equation "\"GapSize\" = Thickness"
equation "\"Thickness\" = 0.5"
properties part number "Ring B-3" material "Wood (Maple)"
